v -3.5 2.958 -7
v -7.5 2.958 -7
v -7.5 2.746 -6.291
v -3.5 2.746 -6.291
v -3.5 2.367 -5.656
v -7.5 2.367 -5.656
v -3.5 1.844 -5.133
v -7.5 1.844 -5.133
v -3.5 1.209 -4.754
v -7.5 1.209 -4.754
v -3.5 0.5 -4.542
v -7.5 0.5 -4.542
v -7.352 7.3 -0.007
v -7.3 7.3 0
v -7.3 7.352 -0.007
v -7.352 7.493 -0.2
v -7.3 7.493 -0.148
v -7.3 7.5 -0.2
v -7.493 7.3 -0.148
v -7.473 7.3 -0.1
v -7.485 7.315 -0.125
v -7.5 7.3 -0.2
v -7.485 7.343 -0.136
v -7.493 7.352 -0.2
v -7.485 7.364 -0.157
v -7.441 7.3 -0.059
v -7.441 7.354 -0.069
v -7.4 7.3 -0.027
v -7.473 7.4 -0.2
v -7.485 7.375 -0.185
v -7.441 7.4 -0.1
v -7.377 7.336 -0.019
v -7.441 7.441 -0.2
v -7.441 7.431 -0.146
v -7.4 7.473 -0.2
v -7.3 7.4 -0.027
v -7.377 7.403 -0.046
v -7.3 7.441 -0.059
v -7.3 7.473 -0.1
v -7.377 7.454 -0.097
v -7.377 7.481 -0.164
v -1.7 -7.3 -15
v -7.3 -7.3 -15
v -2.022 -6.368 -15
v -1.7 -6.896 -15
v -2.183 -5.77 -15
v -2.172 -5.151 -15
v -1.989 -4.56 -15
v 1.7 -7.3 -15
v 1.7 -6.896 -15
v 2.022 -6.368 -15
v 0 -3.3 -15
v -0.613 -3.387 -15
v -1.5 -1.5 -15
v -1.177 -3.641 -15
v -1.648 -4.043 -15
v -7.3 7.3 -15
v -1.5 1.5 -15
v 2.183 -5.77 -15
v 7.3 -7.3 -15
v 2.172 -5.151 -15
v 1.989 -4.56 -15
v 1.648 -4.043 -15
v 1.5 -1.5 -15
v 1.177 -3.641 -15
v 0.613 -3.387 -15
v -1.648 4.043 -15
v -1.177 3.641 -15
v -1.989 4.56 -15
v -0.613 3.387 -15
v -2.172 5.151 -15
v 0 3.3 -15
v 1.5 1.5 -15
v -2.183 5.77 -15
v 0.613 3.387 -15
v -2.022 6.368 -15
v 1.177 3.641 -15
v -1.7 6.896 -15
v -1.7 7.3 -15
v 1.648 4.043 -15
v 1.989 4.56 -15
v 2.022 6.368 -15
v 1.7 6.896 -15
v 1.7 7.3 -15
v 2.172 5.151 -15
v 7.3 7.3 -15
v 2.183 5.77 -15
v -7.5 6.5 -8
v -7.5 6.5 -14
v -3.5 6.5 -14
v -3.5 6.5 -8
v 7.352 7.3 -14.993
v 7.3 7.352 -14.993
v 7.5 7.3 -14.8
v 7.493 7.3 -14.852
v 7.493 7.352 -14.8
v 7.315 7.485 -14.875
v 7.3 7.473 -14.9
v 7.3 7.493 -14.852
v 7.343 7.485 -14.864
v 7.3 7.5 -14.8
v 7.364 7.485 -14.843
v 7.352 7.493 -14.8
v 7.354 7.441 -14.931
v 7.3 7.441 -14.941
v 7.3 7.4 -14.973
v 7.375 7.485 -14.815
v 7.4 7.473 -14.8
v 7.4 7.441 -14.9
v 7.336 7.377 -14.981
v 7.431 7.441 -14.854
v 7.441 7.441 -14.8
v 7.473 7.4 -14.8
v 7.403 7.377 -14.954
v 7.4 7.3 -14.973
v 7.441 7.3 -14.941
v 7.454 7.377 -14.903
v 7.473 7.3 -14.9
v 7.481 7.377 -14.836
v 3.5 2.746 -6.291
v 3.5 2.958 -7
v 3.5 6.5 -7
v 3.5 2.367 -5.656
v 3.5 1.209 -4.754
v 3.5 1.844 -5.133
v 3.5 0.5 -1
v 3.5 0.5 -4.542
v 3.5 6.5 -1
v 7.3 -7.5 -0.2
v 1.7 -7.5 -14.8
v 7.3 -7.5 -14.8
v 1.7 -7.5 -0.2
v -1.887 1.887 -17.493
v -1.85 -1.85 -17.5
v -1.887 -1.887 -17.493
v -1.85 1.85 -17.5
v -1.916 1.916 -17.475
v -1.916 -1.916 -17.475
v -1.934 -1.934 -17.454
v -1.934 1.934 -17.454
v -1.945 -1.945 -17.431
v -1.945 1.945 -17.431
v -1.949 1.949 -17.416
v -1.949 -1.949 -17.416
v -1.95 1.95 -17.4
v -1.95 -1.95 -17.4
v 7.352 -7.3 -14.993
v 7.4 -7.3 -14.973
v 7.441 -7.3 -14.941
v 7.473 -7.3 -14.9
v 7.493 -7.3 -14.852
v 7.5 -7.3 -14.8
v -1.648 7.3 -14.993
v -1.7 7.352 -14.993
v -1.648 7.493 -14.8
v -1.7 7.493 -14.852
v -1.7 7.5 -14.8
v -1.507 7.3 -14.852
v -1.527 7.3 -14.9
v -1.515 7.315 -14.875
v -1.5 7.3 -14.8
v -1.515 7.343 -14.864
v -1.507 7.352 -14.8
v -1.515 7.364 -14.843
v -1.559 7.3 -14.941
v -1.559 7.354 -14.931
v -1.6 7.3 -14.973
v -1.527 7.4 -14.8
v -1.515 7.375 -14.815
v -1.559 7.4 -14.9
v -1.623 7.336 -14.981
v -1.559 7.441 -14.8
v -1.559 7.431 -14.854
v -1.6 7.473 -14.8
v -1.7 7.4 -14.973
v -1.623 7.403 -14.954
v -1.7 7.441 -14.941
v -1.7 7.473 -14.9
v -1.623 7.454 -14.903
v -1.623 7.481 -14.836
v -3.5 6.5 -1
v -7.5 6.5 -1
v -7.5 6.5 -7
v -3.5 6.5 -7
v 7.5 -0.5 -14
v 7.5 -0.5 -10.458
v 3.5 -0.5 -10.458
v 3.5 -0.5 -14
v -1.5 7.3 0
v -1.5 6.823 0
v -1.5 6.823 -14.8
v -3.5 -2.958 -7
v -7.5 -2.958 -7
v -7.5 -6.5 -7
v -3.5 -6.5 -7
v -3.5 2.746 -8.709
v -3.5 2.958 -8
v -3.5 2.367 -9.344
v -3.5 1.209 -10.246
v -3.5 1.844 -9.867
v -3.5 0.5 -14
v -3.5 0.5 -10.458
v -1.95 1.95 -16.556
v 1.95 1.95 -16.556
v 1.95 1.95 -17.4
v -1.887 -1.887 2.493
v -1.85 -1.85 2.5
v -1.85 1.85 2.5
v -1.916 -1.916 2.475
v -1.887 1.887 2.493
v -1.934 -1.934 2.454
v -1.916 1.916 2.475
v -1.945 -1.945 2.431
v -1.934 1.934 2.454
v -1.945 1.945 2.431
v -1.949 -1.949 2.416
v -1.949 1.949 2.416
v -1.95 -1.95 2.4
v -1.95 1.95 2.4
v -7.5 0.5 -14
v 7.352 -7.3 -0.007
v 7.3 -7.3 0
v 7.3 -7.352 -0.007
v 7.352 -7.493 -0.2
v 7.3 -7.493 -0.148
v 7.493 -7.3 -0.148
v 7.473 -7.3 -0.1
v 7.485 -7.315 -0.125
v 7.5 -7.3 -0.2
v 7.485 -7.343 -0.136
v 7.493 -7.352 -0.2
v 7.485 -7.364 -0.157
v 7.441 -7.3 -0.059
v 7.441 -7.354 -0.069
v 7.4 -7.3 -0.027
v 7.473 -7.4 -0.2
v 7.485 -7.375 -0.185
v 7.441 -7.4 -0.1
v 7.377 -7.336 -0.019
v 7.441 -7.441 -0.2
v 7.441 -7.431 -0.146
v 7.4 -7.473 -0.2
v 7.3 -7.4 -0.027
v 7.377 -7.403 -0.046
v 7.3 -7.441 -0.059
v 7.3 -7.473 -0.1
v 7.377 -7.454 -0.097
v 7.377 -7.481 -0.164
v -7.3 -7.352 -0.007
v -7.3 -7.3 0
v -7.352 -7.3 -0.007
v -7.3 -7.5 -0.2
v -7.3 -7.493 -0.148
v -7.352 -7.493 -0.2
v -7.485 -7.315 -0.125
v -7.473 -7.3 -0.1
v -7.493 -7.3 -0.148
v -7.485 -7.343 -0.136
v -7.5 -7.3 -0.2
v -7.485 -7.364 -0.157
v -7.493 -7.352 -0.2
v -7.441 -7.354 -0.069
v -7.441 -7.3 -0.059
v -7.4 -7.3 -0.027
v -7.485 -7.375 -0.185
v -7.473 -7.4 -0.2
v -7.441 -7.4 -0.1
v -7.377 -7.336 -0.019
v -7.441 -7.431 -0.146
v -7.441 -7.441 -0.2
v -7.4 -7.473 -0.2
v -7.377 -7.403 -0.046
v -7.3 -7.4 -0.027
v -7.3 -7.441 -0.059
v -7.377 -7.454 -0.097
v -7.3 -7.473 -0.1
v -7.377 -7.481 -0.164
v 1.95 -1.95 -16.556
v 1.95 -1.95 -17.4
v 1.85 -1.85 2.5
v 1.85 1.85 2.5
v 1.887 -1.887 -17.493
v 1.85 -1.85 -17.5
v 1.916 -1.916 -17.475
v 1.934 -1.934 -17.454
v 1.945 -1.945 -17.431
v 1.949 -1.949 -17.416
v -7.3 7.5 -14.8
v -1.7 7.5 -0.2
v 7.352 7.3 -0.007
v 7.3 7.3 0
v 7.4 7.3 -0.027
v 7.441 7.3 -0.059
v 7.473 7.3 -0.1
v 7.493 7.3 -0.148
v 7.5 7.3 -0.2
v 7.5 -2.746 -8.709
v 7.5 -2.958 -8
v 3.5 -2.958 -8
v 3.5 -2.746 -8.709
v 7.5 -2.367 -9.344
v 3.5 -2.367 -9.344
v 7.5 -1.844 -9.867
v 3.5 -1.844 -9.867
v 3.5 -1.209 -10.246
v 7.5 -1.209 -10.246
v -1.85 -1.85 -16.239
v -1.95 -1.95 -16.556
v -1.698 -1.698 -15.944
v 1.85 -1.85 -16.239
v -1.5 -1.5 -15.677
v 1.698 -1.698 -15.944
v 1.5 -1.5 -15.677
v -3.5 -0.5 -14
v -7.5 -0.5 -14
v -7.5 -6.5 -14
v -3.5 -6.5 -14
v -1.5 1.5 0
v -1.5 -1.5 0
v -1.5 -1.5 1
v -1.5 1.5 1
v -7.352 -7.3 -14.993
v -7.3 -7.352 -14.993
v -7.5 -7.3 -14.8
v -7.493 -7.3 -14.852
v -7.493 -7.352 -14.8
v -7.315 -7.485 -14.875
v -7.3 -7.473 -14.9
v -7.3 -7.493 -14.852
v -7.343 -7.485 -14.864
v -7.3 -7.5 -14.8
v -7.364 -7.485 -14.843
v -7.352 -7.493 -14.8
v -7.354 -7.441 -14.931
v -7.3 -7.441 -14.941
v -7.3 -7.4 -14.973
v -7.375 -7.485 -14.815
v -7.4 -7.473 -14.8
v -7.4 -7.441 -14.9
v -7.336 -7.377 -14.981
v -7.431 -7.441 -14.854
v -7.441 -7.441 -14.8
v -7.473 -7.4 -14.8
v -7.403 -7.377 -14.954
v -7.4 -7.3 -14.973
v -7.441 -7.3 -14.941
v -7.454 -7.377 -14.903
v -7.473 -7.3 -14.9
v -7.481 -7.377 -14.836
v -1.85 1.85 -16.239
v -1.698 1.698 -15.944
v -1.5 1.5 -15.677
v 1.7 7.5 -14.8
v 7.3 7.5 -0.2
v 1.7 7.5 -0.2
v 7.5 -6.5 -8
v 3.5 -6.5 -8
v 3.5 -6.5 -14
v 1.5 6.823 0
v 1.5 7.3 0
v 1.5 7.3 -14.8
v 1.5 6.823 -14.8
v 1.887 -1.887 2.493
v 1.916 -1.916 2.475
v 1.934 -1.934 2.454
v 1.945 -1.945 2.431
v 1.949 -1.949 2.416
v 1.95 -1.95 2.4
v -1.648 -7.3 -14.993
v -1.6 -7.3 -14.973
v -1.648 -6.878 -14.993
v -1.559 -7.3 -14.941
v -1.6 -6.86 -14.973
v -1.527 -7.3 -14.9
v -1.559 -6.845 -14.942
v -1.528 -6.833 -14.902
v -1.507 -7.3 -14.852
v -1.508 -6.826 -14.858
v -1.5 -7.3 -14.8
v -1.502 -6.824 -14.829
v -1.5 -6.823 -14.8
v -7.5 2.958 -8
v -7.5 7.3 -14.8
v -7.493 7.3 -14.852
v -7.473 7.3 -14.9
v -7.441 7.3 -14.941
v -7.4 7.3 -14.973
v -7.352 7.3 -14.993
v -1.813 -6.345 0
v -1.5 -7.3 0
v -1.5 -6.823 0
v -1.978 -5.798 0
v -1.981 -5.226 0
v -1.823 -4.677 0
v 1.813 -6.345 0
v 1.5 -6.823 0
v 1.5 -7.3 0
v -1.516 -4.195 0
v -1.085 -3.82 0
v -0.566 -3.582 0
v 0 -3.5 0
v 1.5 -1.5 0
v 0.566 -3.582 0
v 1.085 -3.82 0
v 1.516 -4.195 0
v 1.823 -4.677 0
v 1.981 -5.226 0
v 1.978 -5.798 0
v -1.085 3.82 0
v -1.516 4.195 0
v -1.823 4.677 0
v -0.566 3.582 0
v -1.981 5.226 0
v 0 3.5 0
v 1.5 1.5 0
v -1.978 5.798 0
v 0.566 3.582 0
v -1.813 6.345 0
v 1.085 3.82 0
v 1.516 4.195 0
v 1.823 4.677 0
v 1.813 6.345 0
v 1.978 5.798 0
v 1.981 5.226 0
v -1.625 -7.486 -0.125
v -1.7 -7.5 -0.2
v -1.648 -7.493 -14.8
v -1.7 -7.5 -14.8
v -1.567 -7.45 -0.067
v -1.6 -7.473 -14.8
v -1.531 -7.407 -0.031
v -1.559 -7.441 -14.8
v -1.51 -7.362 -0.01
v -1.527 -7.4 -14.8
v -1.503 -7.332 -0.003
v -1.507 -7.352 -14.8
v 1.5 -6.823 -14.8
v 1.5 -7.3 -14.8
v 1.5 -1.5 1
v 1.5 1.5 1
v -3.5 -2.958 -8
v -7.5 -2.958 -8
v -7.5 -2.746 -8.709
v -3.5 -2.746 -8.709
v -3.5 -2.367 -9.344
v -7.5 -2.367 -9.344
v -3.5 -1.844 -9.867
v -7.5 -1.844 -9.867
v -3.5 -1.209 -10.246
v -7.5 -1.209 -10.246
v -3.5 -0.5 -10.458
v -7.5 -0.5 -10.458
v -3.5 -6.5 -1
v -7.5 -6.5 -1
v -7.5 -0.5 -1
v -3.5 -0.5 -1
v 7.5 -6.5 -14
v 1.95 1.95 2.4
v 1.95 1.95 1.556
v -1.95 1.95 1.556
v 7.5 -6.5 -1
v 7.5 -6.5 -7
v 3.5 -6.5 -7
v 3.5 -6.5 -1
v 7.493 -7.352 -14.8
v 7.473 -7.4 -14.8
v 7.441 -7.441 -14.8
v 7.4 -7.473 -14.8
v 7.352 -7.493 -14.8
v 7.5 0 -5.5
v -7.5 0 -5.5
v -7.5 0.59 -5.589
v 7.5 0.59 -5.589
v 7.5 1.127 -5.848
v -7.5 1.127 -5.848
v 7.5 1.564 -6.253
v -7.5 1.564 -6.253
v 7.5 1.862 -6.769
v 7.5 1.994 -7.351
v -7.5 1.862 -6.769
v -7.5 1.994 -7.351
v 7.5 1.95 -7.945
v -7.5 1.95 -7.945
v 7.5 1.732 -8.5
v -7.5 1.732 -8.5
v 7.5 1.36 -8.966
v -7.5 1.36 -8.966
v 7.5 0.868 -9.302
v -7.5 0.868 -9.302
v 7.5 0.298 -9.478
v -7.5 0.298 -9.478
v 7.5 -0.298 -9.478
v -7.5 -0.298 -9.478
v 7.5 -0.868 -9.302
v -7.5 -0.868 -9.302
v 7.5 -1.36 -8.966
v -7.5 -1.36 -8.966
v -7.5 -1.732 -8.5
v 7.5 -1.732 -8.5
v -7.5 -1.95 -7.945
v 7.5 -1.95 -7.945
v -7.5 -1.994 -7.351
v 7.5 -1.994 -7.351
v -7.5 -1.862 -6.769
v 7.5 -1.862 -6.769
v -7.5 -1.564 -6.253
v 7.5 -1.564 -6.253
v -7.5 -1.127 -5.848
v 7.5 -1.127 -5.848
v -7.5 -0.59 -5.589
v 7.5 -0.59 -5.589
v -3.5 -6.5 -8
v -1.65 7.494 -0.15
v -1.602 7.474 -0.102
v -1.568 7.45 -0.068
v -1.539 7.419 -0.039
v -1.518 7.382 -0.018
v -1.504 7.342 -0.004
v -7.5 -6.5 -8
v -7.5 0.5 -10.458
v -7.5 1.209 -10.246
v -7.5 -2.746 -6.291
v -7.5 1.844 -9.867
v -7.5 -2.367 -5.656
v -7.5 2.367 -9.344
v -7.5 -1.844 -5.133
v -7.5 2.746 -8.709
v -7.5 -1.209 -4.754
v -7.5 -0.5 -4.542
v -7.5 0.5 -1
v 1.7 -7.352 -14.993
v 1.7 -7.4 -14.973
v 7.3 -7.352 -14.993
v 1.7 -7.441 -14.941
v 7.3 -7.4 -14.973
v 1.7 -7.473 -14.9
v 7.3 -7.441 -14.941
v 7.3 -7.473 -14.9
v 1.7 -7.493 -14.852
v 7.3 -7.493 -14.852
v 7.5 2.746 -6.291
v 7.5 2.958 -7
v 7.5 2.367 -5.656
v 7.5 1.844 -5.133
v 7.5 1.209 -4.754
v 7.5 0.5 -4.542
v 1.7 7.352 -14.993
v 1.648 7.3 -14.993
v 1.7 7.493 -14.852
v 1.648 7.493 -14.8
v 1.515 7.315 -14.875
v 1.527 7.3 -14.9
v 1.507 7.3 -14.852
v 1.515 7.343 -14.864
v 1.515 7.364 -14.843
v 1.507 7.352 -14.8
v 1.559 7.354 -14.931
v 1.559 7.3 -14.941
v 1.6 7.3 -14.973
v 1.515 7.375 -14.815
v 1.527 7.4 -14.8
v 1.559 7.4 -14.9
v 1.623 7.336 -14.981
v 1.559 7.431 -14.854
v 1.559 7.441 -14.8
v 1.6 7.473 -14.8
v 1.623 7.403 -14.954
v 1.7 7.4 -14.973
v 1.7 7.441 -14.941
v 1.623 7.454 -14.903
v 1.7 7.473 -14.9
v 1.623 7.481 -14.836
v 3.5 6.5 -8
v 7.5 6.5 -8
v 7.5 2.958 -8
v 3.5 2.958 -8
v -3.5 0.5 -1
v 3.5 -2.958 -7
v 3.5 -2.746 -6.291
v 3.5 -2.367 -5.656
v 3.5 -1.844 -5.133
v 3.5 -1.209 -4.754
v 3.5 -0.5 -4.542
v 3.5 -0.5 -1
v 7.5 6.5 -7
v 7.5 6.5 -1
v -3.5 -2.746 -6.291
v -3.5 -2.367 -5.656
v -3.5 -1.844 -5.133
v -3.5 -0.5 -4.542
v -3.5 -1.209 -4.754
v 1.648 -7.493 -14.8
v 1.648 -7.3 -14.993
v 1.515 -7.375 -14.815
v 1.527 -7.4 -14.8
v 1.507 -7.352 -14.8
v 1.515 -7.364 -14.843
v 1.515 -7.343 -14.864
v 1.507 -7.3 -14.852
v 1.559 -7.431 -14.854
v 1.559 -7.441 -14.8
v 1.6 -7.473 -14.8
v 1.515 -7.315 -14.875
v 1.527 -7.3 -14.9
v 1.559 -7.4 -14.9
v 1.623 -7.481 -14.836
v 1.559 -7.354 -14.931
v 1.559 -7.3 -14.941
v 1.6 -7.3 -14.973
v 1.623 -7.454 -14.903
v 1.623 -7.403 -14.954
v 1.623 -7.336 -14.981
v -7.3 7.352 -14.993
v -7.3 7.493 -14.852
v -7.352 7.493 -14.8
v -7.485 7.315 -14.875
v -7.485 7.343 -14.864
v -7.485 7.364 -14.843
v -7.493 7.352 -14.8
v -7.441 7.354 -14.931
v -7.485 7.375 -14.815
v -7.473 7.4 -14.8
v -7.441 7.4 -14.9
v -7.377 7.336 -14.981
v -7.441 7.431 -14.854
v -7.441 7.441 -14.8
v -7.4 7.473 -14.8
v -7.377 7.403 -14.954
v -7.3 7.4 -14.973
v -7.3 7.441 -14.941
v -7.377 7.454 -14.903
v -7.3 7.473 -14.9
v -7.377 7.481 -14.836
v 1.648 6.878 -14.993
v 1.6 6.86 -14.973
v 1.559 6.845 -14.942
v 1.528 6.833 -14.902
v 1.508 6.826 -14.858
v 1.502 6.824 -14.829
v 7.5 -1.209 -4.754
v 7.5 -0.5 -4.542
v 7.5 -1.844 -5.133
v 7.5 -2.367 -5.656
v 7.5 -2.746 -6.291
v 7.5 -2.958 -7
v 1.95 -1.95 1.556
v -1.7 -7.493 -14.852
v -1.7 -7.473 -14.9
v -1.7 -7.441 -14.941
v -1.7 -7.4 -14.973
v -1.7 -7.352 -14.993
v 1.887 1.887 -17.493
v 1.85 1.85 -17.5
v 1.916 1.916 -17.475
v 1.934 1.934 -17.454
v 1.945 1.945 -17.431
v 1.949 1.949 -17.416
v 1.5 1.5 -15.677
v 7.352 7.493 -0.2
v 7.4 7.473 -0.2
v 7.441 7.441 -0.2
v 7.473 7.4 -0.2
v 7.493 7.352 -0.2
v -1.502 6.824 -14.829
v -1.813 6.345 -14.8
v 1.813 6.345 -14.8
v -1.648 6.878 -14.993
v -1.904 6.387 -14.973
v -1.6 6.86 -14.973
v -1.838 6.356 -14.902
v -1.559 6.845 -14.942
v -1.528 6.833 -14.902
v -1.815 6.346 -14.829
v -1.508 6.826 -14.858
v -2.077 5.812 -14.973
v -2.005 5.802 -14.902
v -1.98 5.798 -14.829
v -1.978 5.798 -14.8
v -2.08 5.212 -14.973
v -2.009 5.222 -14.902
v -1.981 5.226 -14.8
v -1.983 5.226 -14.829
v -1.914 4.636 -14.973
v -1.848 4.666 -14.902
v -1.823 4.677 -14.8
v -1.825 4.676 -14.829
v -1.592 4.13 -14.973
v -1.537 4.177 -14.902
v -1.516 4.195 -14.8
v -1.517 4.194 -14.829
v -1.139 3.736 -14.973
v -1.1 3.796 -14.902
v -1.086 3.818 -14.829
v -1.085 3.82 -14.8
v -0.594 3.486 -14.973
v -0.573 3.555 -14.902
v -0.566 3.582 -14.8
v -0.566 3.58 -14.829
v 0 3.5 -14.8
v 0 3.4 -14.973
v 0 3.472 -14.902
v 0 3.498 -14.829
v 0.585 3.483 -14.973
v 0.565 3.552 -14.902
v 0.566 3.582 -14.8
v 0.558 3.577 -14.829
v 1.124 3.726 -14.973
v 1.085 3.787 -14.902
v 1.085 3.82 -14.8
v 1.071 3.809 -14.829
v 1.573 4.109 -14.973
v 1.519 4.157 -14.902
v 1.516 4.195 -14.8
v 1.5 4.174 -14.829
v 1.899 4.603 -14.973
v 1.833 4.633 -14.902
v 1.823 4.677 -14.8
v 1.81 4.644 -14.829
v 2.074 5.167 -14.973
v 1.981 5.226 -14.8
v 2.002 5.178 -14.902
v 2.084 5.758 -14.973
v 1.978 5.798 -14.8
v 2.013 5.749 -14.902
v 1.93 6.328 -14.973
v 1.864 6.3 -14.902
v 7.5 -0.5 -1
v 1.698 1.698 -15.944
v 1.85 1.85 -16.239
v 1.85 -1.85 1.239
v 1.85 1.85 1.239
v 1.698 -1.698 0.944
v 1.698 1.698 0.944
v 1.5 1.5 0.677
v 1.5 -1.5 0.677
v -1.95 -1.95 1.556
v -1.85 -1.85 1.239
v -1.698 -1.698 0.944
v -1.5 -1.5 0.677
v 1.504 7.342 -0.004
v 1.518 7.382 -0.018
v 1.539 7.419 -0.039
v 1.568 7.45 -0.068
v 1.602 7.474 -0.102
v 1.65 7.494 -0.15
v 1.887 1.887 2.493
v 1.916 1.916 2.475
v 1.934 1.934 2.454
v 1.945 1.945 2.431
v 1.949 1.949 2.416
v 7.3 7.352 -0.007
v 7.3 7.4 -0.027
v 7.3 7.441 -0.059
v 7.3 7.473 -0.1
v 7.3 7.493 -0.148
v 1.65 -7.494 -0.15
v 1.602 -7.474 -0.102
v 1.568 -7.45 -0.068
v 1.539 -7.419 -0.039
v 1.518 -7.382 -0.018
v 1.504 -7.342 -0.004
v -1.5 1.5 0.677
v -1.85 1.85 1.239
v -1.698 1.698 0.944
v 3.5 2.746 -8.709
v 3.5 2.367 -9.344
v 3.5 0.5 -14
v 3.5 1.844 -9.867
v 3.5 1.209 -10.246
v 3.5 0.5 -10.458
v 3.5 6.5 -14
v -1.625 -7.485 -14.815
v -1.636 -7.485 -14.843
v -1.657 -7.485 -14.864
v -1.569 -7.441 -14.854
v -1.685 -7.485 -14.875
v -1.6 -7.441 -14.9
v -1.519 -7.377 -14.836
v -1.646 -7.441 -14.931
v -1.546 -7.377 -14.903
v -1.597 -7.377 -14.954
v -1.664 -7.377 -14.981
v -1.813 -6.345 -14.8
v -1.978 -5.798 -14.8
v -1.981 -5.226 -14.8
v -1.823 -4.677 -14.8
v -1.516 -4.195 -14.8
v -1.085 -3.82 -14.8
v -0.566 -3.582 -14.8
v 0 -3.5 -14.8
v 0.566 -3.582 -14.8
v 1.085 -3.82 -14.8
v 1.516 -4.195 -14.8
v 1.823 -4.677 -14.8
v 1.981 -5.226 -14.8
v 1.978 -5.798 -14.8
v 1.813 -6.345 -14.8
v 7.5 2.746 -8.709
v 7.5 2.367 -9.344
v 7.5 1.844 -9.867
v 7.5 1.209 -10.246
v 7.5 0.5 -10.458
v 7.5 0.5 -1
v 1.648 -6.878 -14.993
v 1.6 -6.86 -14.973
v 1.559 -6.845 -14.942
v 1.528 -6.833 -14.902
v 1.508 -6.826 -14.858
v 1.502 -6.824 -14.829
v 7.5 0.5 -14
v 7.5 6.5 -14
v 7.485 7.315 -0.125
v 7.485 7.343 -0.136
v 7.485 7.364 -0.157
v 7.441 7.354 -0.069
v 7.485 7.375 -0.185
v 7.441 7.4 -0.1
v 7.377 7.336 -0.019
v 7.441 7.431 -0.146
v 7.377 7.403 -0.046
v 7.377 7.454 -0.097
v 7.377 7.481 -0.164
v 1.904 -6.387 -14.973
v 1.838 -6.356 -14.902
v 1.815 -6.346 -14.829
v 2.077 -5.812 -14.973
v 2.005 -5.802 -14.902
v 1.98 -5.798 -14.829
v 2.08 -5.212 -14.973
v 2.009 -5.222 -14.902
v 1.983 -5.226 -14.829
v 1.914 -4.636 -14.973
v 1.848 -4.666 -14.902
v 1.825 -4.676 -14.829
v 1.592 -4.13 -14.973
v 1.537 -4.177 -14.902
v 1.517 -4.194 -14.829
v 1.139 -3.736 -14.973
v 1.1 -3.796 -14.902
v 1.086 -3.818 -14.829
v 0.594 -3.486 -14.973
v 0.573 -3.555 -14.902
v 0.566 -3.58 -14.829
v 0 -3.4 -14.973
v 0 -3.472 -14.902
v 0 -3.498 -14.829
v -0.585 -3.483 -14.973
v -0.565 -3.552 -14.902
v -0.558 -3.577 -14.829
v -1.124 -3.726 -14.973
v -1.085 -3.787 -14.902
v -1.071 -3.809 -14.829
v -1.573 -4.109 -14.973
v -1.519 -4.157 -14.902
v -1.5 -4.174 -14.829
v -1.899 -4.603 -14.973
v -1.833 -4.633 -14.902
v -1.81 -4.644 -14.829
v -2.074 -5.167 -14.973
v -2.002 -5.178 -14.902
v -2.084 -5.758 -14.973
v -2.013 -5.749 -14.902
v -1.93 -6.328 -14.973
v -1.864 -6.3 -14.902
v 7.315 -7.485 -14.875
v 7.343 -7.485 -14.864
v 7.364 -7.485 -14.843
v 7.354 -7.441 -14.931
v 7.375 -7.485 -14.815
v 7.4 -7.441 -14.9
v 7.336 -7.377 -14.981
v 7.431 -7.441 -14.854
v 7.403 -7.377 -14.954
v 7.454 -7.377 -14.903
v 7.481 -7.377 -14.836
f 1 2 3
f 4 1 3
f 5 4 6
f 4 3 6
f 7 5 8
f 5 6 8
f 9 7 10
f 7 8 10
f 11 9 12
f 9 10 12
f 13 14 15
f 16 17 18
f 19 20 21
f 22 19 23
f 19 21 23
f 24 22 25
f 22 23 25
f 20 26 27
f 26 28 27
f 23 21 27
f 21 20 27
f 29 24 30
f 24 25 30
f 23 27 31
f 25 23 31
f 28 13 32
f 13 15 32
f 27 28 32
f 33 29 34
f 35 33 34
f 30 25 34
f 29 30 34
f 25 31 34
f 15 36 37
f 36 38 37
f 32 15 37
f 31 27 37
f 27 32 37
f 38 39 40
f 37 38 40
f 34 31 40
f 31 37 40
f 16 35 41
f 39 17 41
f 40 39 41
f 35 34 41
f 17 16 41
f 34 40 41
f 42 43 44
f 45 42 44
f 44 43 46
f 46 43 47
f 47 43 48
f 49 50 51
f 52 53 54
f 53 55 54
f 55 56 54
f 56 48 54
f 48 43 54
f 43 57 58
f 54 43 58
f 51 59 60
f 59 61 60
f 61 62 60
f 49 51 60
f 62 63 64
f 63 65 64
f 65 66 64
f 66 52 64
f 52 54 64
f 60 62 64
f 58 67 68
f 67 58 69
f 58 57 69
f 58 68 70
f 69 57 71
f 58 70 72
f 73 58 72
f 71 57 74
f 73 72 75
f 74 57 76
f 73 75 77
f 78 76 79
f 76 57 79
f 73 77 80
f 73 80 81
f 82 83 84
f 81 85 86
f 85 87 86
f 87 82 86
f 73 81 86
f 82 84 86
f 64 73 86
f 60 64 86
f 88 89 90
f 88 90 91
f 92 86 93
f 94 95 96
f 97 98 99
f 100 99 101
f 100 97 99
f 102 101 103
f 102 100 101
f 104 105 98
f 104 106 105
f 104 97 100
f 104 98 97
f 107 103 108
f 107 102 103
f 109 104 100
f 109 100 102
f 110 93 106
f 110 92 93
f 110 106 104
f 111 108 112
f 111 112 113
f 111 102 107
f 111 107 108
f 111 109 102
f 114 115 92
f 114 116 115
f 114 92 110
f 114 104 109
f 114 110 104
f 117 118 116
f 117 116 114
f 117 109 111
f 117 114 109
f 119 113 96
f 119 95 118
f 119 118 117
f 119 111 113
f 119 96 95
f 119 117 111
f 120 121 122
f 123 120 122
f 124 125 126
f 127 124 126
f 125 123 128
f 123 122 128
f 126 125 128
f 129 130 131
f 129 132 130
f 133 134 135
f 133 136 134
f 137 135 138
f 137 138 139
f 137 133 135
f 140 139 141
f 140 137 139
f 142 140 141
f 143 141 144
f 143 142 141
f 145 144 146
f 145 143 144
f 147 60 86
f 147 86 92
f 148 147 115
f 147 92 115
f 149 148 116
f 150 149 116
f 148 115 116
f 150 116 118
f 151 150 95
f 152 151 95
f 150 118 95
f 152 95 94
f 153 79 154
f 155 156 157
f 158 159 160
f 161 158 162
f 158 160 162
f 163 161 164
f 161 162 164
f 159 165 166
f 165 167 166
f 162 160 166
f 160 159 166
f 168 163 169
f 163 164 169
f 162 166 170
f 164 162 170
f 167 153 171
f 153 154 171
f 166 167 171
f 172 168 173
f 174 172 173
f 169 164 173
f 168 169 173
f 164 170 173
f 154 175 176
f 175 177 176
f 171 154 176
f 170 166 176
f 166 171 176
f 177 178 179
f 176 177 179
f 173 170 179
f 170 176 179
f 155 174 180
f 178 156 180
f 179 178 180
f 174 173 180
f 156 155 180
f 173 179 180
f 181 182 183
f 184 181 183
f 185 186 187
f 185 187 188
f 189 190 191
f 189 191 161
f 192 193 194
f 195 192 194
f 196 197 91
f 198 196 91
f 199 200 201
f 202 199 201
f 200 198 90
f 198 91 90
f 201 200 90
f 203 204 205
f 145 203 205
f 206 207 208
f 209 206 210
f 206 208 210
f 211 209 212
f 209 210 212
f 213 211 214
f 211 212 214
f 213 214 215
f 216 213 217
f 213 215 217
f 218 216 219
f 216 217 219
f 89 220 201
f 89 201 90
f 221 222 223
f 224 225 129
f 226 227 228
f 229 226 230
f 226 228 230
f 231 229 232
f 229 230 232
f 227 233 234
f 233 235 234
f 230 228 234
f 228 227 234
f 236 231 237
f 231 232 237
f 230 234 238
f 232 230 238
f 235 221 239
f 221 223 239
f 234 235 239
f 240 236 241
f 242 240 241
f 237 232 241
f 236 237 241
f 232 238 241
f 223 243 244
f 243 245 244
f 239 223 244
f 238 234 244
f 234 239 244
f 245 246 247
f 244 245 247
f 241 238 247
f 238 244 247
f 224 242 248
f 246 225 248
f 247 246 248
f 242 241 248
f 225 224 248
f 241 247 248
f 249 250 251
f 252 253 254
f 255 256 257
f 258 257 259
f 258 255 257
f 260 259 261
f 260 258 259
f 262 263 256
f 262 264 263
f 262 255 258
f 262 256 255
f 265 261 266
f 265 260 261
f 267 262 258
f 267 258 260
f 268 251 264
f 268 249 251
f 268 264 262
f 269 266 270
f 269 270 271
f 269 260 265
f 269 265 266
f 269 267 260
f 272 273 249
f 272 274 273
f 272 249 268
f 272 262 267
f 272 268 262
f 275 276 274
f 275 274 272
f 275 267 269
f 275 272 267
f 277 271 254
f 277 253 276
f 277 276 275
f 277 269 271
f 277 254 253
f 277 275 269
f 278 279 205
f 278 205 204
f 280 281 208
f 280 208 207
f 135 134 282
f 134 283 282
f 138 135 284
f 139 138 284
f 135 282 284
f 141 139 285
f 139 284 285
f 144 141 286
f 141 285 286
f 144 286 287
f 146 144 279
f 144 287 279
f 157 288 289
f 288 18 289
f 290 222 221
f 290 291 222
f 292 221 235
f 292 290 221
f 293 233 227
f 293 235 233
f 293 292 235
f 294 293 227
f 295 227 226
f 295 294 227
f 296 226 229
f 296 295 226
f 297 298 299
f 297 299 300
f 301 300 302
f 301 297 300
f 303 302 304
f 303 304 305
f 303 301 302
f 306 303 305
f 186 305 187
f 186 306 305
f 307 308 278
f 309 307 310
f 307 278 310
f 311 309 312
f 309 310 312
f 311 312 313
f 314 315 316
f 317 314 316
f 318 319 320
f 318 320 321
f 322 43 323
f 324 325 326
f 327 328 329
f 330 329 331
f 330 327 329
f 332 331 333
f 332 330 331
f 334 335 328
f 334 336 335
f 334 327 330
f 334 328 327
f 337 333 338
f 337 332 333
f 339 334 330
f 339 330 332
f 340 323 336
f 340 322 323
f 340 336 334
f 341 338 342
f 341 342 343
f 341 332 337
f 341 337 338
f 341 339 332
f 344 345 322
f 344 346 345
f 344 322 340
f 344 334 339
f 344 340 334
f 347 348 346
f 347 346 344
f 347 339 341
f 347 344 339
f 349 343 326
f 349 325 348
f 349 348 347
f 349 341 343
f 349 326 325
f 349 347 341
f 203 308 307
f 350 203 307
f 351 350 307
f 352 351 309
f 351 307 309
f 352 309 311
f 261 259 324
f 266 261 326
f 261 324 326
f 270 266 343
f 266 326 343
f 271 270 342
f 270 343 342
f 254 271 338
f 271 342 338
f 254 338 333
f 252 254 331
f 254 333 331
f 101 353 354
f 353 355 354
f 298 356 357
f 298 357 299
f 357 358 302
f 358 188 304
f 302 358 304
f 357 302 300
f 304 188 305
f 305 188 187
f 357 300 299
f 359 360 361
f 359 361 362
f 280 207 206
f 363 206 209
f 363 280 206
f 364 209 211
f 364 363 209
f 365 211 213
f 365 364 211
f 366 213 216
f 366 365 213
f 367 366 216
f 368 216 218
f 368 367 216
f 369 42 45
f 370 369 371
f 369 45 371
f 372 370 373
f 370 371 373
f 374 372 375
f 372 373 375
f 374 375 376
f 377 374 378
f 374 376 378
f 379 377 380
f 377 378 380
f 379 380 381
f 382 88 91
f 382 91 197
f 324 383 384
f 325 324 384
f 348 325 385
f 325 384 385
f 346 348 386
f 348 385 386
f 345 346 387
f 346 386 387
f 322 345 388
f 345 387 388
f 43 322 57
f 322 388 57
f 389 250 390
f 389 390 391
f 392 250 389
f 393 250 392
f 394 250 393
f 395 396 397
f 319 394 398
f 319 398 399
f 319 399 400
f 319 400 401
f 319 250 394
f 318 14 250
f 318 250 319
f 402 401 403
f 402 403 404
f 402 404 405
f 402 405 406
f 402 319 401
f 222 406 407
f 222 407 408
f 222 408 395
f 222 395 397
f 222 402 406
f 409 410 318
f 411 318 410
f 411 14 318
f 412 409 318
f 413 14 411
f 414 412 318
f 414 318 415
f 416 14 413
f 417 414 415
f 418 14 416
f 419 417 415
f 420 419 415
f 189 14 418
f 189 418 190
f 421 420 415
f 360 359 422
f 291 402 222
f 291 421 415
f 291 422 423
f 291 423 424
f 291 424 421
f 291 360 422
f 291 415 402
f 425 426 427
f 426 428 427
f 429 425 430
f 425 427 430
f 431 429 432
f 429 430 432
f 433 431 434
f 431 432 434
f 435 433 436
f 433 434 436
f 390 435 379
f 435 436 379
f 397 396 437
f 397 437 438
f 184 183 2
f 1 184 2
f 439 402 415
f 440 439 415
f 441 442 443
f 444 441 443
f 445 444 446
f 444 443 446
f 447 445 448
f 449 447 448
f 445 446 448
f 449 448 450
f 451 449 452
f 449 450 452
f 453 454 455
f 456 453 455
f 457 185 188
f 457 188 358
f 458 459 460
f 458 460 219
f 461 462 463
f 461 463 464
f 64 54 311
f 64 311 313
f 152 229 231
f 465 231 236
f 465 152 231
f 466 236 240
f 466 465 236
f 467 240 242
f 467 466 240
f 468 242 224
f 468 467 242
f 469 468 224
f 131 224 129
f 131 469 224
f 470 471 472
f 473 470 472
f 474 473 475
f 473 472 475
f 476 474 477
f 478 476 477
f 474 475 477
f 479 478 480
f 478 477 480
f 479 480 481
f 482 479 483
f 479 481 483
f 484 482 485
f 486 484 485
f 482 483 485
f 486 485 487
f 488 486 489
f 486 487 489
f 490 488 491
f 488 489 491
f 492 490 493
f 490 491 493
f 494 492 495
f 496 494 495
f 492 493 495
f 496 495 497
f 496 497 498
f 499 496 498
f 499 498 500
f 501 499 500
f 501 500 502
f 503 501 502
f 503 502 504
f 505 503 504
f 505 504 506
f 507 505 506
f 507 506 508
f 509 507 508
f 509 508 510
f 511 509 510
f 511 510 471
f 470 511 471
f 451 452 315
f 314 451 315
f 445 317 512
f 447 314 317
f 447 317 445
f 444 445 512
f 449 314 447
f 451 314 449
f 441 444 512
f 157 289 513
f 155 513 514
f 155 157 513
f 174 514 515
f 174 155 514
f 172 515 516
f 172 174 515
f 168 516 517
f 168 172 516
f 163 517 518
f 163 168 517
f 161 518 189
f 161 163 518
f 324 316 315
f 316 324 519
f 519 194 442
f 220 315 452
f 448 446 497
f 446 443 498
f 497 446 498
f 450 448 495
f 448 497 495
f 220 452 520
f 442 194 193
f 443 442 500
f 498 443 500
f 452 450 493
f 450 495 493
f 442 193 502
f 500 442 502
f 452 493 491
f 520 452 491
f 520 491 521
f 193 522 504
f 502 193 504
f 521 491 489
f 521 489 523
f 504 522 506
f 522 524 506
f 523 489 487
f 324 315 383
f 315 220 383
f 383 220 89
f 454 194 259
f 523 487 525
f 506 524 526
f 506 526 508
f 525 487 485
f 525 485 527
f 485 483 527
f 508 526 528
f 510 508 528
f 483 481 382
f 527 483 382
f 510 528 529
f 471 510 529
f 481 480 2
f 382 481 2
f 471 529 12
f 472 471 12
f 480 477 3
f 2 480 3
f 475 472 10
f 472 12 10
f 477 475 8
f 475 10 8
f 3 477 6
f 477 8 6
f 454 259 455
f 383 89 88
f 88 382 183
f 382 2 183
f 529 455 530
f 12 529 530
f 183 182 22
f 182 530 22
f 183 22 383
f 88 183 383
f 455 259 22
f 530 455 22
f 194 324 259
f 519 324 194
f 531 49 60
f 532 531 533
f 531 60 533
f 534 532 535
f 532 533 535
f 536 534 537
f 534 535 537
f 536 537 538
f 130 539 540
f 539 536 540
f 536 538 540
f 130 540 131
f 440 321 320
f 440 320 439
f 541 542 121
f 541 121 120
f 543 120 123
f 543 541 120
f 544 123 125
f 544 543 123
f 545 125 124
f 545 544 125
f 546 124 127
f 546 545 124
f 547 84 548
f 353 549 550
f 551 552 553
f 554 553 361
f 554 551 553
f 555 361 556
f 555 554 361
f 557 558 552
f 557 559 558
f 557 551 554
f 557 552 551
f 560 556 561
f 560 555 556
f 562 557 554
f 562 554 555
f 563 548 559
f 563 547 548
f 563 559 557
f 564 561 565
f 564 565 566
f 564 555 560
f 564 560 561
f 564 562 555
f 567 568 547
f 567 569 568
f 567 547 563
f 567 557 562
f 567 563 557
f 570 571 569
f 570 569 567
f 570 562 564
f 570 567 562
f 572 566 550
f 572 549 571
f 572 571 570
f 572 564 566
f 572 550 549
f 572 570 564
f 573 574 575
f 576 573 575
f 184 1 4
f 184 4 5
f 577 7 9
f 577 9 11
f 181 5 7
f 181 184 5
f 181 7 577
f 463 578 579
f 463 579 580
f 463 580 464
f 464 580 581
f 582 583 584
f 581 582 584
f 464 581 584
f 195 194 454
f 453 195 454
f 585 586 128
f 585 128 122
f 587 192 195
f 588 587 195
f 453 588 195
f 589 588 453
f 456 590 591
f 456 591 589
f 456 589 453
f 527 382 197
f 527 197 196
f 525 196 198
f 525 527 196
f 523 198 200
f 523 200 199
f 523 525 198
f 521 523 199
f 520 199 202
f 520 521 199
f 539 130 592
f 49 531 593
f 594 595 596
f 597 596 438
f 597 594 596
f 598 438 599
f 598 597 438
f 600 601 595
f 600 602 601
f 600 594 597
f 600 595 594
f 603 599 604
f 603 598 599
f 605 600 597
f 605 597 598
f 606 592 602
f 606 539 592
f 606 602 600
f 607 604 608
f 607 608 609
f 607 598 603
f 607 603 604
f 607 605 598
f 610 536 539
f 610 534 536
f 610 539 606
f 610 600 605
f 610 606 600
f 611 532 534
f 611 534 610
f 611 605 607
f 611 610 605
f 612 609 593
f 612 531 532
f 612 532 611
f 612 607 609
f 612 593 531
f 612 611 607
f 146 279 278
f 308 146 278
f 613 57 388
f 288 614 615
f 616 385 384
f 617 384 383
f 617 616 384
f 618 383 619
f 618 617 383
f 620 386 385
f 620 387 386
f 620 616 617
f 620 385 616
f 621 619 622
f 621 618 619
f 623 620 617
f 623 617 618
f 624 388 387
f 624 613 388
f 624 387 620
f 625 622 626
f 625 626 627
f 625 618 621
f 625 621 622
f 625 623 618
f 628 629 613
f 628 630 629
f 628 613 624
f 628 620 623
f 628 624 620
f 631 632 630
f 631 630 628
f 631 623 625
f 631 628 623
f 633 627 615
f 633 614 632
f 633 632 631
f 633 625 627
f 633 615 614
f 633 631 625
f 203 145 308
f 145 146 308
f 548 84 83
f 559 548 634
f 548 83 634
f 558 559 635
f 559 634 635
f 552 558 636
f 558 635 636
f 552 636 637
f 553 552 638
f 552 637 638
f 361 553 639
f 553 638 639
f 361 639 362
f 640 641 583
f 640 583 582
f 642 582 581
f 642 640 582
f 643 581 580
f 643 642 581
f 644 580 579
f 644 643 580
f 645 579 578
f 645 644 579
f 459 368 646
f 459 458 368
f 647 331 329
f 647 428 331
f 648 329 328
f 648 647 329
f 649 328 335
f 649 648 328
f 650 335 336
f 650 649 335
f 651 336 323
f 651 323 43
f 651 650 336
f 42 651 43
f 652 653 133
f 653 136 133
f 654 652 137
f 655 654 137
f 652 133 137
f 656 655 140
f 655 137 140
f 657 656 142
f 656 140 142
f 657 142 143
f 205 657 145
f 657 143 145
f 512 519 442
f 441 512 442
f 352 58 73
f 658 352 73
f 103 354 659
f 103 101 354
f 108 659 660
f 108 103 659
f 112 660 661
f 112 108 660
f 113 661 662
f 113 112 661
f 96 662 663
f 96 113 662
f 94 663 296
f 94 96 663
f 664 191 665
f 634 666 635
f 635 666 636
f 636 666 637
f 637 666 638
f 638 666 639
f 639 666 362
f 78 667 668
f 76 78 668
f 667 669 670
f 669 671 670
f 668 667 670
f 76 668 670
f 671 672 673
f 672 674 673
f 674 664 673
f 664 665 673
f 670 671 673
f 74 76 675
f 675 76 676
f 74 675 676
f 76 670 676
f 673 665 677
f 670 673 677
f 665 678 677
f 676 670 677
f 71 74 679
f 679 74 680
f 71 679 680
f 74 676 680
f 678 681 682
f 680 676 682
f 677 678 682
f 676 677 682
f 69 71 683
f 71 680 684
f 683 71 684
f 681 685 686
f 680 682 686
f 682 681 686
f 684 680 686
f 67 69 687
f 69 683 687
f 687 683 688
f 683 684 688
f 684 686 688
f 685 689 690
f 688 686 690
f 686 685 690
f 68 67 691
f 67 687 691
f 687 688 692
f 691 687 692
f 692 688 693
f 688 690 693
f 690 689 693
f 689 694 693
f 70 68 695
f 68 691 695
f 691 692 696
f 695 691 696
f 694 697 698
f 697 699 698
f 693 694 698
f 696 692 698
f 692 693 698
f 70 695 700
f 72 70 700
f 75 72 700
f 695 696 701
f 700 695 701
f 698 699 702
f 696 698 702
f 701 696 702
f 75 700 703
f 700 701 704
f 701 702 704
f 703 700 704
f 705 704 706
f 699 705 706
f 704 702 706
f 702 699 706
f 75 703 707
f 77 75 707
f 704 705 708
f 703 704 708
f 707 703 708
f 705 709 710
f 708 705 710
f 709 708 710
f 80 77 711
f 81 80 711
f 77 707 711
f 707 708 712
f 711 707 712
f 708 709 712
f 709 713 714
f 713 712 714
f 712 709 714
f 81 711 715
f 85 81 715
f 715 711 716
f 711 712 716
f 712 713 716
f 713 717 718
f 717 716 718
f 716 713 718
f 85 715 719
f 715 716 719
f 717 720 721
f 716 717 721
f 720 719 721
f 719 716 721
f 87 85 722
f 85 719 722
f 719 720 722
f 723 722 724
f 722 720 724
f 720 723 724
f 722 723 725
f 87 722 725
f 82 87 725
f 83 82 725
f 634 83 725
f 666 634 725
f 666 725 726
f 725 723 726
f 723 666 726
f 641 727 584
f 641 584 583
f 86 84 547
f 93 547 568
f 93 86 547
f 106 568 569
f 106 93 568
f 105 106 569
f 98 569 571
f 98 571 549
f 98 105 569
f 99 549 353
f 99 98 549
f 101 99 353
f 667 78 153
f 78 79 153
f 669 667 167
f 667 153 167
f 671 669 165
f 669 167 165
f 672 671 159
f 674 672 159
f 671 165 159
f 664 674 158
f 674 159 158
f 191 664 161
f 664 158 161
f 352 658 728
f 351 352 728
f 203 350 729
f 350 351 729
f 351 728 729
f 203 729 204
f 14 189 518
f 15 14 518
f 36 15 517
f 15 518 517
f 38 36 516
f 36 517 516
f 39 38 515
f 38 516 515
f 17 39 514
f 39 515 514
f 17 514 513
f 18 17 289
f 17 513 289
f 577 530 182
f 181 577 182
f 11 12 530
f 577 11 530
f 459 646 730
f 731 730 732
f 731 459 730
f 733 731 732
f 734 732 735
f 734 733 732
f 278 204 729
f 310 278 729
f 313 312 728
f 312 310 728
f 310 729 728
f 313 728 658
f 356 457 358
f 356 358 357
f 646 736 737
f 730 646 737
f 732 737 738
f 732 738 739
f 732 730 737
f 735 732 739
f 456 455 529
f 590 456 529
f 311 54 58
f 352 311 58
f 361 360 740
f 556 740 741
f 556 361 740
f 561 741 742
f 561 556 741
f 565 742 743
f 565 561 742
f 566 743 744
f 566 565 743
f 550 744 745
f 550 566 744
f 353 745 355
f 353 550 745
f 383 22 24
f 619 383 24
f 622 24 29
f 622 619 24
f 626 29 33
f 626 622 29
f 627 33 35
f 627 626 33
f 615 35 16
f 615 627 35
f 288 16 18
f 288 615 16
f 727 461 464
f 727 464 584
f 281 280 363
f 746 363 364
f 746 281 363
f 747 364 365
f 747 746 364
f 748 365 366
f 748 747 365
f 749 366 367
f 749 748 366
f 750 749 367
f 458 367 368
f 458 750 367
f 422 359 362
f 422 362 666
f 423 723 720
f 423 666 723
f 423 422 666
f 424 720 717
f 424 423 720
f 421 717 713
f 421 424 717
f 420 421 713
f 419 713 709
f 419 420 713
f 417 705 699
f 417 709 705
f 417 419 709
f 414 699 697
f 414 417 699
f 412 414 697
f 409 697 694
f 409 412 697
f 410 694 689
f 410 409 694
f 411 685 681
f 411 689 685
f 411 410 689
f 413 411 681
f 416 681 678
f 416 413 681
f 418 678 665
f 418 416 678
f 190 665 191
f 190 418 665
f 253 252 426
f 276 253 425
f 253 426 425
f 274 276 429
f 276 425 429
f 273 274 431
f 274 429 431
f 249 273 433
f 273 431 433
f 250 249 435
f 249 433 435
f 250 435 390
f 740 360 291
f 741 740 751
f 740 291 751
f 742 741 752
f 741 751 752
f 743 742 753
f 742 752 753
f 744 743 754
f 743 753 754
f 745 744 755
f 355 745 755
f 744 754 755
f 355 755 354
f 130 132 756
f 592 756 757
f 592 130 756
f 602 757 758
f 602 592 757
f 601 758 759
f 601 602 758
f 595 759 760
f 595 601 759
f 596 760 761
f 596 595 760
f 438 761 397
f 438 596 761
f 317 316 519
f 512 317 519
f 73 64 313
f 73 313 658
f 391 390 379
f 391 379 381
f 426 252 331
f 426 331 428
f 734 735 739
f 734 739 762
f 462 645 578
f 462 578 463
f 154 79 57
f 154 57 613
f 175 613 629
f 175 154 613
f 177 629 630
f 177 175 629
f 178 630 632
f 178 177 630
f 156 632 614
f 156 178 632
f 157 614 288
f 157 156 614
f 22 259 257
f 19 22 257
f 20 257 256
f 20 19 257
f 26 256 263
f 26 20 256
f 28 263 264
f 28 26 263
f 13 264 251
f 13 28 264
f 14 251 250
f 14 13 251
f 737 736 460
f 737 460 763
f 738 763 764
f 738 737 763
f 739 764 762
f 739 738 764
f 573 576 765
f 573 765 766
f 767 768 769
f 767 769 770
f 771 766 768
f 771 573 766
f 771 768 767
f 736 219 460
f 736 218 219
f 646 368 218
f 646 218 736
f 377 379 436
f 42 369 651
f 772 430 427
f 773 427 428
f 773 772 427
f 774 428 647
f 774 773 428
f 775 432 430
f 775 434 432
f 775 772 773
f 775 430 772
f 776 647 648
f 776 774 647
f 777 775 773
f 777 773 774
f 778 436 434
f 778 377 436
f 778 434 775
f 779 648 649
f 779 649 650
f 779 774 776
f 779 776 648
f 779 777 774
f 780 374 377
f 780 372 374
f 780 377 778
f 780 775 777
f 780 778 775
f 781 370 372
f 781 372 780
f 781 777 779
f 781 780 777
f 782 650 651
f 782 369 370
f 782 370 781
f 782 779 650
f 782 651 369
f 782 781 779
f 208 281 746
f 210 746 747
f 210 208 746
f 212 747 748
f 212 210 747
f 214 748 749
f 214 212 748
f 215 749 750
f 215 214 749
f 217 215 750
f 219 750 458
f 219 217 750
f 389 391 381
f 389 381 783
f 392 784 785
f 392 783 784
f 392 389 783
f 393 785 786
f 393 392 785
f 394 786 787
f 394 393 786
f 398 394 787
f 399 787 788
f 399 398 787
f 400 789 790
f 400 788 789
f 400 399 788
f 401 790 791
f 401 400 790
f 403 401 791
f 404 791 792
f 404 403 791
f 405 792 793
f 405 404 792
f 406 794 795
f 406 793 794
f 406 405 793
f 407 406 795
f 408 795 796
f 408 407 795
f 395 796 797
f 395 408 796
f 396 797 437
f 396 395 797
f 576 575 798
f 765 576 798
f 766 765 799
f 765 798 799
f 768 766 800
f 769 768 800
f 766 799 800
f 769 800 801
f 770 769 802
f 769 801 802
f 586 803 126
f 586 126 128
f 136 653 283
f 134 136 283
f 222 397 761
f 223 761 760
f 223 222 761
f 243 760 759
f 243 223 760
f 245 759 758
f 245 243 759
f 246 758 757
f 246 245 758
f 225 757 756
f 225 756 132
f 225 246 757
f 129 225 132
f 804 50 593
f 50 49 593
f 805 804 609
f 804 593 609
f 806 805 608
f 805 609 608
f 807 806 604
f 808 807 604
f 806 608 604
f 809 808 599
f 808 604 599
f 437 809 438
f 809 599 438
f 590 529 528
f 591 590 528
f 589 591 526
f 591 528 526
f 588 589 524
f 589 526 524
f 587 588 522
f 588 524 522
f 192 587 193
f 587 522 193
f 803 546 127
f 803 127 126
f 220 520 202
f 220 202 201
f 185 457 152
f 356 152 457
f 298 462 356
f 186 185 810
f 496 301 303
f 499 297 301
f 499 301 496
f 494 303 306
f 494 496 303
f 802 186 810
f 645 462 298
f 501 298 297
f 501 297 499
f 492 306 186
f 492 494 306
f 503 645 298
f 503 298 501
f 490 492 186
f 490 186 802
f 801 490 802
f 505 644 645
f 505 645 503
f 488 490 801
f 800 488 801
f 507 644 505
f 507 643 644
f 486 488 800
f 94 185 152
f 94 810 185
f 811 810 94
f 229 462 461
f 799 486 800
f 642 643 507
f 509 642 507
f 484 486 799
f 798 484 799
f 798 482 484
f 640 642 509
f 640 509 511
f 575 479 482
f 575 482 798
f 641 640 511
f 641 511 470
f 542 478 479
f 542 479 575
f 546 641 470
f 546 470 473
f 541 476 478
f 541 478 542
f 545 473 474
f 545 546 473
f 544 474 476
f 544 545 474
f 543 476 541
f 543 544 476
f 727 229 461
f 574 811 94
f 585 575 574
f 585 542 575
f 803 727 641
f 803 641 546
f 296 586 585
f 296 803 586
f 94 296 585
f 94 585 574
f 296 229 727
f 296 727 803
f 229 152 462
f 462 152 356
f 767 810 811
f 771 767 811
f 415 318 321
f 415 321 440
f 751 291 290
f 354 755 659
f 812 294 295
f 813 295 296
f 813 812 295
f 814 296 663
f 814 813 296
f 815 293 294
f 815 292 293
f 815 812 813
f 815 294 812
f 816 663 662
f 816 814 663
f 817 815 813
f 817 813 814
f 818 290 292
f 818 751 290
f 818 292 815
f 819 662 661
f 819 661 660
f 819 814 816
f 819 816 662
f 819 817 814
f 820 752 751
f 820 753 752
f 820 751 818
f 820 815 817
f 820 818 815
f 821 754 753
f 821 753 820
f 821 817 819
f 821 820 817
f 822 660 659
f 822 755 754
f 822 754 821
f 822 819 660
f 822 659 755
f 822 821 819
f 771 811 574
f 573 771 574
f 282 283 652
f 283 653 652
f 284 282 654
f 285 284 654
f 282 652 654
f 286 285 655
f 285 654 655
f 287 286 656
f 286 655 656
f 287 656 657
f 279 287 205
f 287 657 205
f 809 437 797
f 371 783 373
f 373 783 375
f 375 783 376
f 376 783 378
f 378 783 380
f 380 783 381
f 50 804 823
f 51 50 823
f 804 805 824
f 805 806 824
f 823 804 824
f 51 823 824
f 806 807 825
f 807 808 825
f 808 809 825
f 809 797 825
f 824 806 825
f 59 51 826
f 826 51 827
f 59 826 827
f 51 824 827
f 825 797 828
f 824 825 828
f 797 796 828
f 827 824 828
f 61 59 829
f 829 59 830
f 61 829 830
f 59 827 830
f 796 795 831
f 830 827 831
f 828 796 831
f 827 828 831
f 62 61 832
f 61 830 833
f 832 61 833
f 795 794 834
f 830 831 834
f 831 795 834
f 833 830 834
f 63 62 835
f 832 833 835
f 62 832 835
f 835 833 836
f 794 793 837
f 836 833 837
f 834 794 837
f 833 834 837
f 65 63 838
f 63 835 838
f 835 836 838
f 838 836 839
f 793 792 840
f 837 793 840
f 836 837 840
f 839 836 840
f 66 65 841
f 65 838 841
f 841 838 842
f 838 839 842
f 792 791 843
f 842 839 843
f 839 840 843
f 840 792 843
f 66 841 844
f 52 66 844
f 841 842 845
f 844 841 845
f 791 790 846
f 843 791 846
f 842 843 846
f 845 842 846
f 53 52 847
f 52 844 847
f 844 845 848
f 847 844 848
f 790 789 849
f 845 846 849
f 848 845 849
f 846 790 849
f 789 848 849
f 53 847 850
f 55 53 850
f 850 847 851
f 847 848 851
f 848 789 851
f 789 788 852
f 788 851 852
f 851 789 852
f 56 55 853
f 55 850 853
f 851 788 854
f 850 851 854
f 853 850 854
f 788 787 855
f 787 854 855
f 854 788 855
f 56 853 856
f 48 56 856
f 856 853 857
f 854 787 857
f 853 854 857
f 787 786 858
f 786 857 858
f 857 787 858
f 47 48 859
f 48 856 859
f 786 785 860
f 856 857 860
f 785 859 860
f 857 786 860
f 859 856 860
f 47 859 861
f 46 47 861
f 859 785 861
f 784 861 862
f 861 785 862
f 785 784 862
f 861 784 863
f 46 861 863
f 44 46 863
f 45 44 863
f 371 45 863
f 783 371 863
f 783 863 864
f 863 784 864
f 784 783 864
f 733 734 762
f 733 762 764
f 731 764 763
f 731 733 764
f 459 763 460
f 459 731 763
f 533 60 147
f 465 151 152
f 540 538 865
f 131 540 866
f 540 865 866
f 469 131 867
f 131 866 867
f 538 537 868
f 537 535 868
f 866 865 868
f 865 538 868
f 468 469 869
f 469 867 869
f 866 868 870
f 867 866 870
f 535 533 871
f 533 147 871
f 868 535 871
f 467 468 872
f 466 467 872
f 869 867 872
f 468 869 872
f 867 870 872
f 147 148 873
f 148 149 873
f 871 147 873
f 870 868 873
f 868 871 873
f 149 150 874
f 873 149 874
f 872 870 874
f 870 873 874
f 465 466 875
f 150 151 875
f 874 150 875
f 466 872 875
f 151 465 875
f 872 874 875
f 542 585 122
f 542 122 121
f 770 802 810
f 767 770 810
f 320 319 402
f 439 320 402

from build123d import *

# Parameters (mm, degrees)
SKETCH_1_W             = 15
SKETCH_1_H             = 15
EXTRUDE_1_DEPTH        = 15
SKETCH_2_W             = 3
SKETCH_2_H             = 3
EXTRUDE_2_DEPTH        = 1
EXTRUDE_3_DEPTH        = 4
CUT_EXTRUDE_1_DEPTH    = 1.95
SKETCH_5_R             = 2
CUT_EXTRUDE_2_DEPTH    = 23.5
CUT_EXTRUDE_3_DEPTH    = 4
CUT_EXTRUDE_START      = -15
CUT_EXTRUDE_4_DEPTH    = 4
CUT_EXTRUDE_5_DEPTH    = 19.371173071
FILLET_1_R             = 0.1
FILLET_2_R             = 0.2
FILLET_1_OF_MIRROR_2_R = 0.1


with BuildPart() as part:
    # 草图1 → 凸台-拉伸1 (new body)
    with BuildSketch(Plane.XY):
        Rectangle(SKETCH_1_W, SKETCH_1_H)
    extrude(amount=-EXTRUDE_1_DEPTH)

    # 草图2 → 凸台-拉伸2 (add)
    with BuildSketch(Plane.XY):
        Rectangle(SKETCH_2_W, SKETCH_2_H)
    extrude_2 = extrude(amount=EXTRUDE_2_DEPTH)

    # 草图5 → 切除-拉伸2 (cut, through all)
    with BuildSketch(Plane.ZY.offset(7.5)):
        with Locations((-7.5, 0)):
            Circle(SKETCH_5_R)
    extrude(amount=-CUT_EXTRUDE_2_DEPTH, mode=Mode.SUBTRACT)

    # 草图6 → 切除-拉伸3 (cut)
    with BuildSketch(Plane.ZY.offset(7.5)):
        with BuildLine():
            Line((-8, 6.5), (-8, 2.958039892))
            ThreePointArc((-8, 2.958039892), (-9.621320344, 2.121320344), (-10.458039892, 0.5))
            Line((-10.458039892, 0.5), (-14, 0.5))
            Line((-14, 0.5), (-14, 6.5))
            Line((-14, 6.5), (-8, 6.5))
        make_face()
        with BuildLine():
            Line((-14, -6.5), (-8, -6.5))
            Line((-8, -6.5), (-8, -2.958039892))
            ThreePointArc((-8, -2.958039892), (-9.621320344, -2.121320344), (-10.458039892, -0.5))
            Line((-10.458039892, -0.5), (-14, -0.5))
            Line((-14, -0.5), (-14, -6.5))
        make_face()
        with BuildLine():
            Line((-1, -6.5), (-1, -0.5))
            Line((-1, -0.5), (-4.541960108, -0.5))
            ThreePointArc((-4.541960108, -0.5), (-5.378679656, -2.121320344), (-7, -2.958039892))
            Line((-7, -2.958039892), (-7, -6.5))
            Line((-7, -6.5), (-1, -6.5))
        make_face()
        with BuildLine():
            Line((-7, 6.5), (-7, 2.958039892))
            ThreePointArc((-7, 2.958039892), (-5.378679656, 2.121320344), (-4.541960108, 0.5))
            Line((-4.541960108, 0.5), (-1, 0.5))
            Line((-1, 0.5), (-1, 6.5))
            Line((-1, 6.5), (-7, 6.5))
        make_face()
    extrude(amount=-CUT_EXTRUDE_3_DEPTH, mode=Mode.SUBTRACT)

    # 草图6<2> → 切除-拉伸4 (cut)
    with BuildSketch(Plane.ZY.offset(7.5).offset(CUT_EXTRUDE_START)):
        with BuildLine():
            Line((-8, 6.5), (-8, 2.958039892))
            ThreePointArc((-8, 2.958039892), (-9.621320344, 2.121320344), (-10.458039892, 0.5))
            Line((-10.458039892, 0.5), (-14, 0.5))
            Line((-14, 0.5), (-14, 6.5))
            Line((-14, 6.5), (-8, 6.5))
        make_face()
        with BuildLine():
            Line((-14, -6.5), (-8, -6.5))
            Line((-8, -6.5), (-8, -2.958039892))
            ThreePointArc((-8, -2.958039892), (-9.621320344, -2.121320344), (-10.458039892, -0.5))
            Line((-10.458039892, -0.5), (-14, -0.5))
            Line((-14, -0.5), (-14, -6.5))
        make_face()
        with BuildLine():
            Line((-1, -6.5), (-1, -0.5))
            Line((-1, -0.5), (-4.541960108, -0.5))
            ThreePointArc((-4.541960108, -0.5), (-5.378679656, -2.121320344), (-7, -2.958039892))
            Line((-7, -2.958039892), (-7, -6.5))
            Line((-7, -6.5), (-1, -6.5))
        make_face()
        with BuildLine():
            Line((-7, 6.5), (-7, 2.958039892))
            ThreePointArc((-7, 2.958039892), (-5.378679656, 2.121320344), (-4.541960108, 0.5))
            Line((-4.541960108, 0.5), (-1, 0.5))
            Line((-1, 0.5), (-1, 6.5))
            Line((-1, 6.5), (-7, 6.5))
        make_face()
    extrude(amount=CUT_EXTRUDE_4_DEPTH, mode=Mode.SUBTRACT)

    # 草图7 → 切除-拉伸5 (cut, through all)
    with BuildSketch(Plane.XY):
        with BuildLine():
            Line((-1.5, -7.5), (-1.5, -6.822875656))
            ThreePointArc((-1.5, -6.822875656), (0, -3.5), (1.5, -6.822875656))
            Line((1.5, -6.822875656), (1.5, -7.5))
            Line((1.5, -7.5), (-1.5, -7.5))
        make_face()
        with BuildLine():
            Line((-1.5, 7.5), (1.5, 7.5))
            Line((1.5, 7.5), (1.5, 6.822875656))
            ThreePointArc((1.5, 6.822875656), (0, 3.5), (-1.5, 6.822875656))
            Line((-1.5, 6.822875656), (-1.5, 7.5))
        make_face()
    extrude(amount=-CUT_EXTRUDE_5_DEPTH, mode=Mode.SUBTRACT)

    # 圆角2
    fillet_2_edges = [part.edges().sort_by_distance(p)[0] for p in [
        (7.5, 0, -15),
        (4.5, 7.5, -15),
        (-4.5, 7.5, -15),
        (-4.5, 7.5, 0),
        (0, 3.5, -15),
        (-1.5, 7.161437828, -15),
        (-1.5, 7.5, -7.5),
        (1.5, 7.161437828, -15),
        (1.5, 7.5, -7.5),
        (4.5, -7.5, -15),
        (4.5, -7.5, 0),
        (1.5, -7.5, -7.5),
        (-1.5, -7.161437828, -15),
        (-1.5, -7.5, -7.5),
        (0, -3.5, -15),
        (1.5, -7.161437828, -15),
        (-7.5, 0, -15),
        (4.5, 7.5, 0),
        (7.5, 0, 0),
        (-4.5, -7.5, 0),
        (-7.5, 0, 0),
        (-4.5, -7.5, -15),
        (-7.5, 7.5, -7.5),
        (7.5, 7.5, -7.5),
        (7.5, -7.5, -7.5),
        (-7.5, -7.5, -7.5),
    ]]
    fillet(fillet_2_edges, radius=FILLET_2_R)


with BuildPart() as body_2:
    # 草图3 → 凸台-拉伸3 (new, symmetric)
    with BuildSketch(Plane(origin=(0, 0, 0), x_dir=(0, 0, -1), z_dir=(1, 0, 0))):
        with BuildLine():
            Line((-2.5, 1.95), (-2.5, -1.95))
            Line((-2.5, -1.95), (-1.555590279, -1.95))
            ThreePointArc((-1.555590279, -1.95), (-1.088161527, -1.780042303), (-0.677124344, -1.5))
            Line((-0.677124344, -1.5), (-0.677124344, 1.5))
            ThreePointArc((-0.677124344, 1.5), (-1.088161527, 1.780042303), (-1.555590279, 1.95))
            Line((-1.555590279, 1.95), (-2.5, 1.95))
        make_face()
    extrude_3 = extrude(amount=EXTRUDE_3_DEPTH, both=True)

    # 草图4 → 切除-拉伸1 (cut, symmetric)
    with BuildSketch(Plane(origin=(0, 0, 0), x_dir=(1, 0, 0), z_dir=(0, 1, 0))):
        with BuildLine():
            Line((-4, -2.5), (-1.95, -2.5))
            Line((-1.95, -2.5), (-1.95, -1.555590279))
            ThreePointArc((-1.95, -1.555590279), (-1.780042303, -1.088161527), (-1.5, -0.677124344))
            Line((-1.5, -0.677124344), (-4, -0.677124344))
            Line((-4, -0.677124344), (-4, -2.5))
        make_face()
        with BuildLine():
            Line((1.95, -2.5), (1.95, -1.555590279))
            ThreePointArc((1.95, -1.555590279), (1.780042303, -1.088161527), (1.5, -0.677124344))
            Line((1.5, -0.677124344), (4, -0.677124344))
            Line((4, -0.677124344), (4, -2.5))
            Line((4, -2.5), (1.95, -2.5))
        make_face()
    cut_extrude_1 = extrude(amount=CUT_EXTRUDE_1_DEPTH, both=True, mode=Mode.SUBTRACT)

    # 圆角1
    fillet_1_edges = [body_2.edges().sort_by_distance(p)[0] for p in [
        (0, 1.95, 2.5),
        (0, -1.95, 2.5),
        (-1.95, 0, 2.5),
        (1.95, 0, 2.5),
    ]]
    fillet(fillet_1_edges, radius=FILLET_1_R)


with BuildPart() as part_1:
    add(part.part)

    # 镜向2: 凸台-拉伸2, 凸台-拉伸3, 切除-拉伸1 across plane
    add(extrude_2.mirror(Plane.XY.offset(-7.5)))
    add(extrude_3.mirror(Plane.XY.offset(-7.5)))
    add(cut_extrude_1.mirror(Plane.XY.offset(-7.5)), mode=Mode.SUBTRACT)

    # 圆角1 of 镜向2
    fillet_1_of_mirror_2_edges = [part_1.edges().sort_by_distance(p)[0] for p in [
        (0, 1.95, -17.5),
        (0, -1.95, -17.5),
        (-1.95, 0, -17.5),
        (1.95, 0, -17.5),
    ]]
    fillet(fillet_1_of_mirror_2_edges, radius=FILLET_1_OF_MIRROR_2_R)


solid = Compound([body_2.part, part_1.part])
